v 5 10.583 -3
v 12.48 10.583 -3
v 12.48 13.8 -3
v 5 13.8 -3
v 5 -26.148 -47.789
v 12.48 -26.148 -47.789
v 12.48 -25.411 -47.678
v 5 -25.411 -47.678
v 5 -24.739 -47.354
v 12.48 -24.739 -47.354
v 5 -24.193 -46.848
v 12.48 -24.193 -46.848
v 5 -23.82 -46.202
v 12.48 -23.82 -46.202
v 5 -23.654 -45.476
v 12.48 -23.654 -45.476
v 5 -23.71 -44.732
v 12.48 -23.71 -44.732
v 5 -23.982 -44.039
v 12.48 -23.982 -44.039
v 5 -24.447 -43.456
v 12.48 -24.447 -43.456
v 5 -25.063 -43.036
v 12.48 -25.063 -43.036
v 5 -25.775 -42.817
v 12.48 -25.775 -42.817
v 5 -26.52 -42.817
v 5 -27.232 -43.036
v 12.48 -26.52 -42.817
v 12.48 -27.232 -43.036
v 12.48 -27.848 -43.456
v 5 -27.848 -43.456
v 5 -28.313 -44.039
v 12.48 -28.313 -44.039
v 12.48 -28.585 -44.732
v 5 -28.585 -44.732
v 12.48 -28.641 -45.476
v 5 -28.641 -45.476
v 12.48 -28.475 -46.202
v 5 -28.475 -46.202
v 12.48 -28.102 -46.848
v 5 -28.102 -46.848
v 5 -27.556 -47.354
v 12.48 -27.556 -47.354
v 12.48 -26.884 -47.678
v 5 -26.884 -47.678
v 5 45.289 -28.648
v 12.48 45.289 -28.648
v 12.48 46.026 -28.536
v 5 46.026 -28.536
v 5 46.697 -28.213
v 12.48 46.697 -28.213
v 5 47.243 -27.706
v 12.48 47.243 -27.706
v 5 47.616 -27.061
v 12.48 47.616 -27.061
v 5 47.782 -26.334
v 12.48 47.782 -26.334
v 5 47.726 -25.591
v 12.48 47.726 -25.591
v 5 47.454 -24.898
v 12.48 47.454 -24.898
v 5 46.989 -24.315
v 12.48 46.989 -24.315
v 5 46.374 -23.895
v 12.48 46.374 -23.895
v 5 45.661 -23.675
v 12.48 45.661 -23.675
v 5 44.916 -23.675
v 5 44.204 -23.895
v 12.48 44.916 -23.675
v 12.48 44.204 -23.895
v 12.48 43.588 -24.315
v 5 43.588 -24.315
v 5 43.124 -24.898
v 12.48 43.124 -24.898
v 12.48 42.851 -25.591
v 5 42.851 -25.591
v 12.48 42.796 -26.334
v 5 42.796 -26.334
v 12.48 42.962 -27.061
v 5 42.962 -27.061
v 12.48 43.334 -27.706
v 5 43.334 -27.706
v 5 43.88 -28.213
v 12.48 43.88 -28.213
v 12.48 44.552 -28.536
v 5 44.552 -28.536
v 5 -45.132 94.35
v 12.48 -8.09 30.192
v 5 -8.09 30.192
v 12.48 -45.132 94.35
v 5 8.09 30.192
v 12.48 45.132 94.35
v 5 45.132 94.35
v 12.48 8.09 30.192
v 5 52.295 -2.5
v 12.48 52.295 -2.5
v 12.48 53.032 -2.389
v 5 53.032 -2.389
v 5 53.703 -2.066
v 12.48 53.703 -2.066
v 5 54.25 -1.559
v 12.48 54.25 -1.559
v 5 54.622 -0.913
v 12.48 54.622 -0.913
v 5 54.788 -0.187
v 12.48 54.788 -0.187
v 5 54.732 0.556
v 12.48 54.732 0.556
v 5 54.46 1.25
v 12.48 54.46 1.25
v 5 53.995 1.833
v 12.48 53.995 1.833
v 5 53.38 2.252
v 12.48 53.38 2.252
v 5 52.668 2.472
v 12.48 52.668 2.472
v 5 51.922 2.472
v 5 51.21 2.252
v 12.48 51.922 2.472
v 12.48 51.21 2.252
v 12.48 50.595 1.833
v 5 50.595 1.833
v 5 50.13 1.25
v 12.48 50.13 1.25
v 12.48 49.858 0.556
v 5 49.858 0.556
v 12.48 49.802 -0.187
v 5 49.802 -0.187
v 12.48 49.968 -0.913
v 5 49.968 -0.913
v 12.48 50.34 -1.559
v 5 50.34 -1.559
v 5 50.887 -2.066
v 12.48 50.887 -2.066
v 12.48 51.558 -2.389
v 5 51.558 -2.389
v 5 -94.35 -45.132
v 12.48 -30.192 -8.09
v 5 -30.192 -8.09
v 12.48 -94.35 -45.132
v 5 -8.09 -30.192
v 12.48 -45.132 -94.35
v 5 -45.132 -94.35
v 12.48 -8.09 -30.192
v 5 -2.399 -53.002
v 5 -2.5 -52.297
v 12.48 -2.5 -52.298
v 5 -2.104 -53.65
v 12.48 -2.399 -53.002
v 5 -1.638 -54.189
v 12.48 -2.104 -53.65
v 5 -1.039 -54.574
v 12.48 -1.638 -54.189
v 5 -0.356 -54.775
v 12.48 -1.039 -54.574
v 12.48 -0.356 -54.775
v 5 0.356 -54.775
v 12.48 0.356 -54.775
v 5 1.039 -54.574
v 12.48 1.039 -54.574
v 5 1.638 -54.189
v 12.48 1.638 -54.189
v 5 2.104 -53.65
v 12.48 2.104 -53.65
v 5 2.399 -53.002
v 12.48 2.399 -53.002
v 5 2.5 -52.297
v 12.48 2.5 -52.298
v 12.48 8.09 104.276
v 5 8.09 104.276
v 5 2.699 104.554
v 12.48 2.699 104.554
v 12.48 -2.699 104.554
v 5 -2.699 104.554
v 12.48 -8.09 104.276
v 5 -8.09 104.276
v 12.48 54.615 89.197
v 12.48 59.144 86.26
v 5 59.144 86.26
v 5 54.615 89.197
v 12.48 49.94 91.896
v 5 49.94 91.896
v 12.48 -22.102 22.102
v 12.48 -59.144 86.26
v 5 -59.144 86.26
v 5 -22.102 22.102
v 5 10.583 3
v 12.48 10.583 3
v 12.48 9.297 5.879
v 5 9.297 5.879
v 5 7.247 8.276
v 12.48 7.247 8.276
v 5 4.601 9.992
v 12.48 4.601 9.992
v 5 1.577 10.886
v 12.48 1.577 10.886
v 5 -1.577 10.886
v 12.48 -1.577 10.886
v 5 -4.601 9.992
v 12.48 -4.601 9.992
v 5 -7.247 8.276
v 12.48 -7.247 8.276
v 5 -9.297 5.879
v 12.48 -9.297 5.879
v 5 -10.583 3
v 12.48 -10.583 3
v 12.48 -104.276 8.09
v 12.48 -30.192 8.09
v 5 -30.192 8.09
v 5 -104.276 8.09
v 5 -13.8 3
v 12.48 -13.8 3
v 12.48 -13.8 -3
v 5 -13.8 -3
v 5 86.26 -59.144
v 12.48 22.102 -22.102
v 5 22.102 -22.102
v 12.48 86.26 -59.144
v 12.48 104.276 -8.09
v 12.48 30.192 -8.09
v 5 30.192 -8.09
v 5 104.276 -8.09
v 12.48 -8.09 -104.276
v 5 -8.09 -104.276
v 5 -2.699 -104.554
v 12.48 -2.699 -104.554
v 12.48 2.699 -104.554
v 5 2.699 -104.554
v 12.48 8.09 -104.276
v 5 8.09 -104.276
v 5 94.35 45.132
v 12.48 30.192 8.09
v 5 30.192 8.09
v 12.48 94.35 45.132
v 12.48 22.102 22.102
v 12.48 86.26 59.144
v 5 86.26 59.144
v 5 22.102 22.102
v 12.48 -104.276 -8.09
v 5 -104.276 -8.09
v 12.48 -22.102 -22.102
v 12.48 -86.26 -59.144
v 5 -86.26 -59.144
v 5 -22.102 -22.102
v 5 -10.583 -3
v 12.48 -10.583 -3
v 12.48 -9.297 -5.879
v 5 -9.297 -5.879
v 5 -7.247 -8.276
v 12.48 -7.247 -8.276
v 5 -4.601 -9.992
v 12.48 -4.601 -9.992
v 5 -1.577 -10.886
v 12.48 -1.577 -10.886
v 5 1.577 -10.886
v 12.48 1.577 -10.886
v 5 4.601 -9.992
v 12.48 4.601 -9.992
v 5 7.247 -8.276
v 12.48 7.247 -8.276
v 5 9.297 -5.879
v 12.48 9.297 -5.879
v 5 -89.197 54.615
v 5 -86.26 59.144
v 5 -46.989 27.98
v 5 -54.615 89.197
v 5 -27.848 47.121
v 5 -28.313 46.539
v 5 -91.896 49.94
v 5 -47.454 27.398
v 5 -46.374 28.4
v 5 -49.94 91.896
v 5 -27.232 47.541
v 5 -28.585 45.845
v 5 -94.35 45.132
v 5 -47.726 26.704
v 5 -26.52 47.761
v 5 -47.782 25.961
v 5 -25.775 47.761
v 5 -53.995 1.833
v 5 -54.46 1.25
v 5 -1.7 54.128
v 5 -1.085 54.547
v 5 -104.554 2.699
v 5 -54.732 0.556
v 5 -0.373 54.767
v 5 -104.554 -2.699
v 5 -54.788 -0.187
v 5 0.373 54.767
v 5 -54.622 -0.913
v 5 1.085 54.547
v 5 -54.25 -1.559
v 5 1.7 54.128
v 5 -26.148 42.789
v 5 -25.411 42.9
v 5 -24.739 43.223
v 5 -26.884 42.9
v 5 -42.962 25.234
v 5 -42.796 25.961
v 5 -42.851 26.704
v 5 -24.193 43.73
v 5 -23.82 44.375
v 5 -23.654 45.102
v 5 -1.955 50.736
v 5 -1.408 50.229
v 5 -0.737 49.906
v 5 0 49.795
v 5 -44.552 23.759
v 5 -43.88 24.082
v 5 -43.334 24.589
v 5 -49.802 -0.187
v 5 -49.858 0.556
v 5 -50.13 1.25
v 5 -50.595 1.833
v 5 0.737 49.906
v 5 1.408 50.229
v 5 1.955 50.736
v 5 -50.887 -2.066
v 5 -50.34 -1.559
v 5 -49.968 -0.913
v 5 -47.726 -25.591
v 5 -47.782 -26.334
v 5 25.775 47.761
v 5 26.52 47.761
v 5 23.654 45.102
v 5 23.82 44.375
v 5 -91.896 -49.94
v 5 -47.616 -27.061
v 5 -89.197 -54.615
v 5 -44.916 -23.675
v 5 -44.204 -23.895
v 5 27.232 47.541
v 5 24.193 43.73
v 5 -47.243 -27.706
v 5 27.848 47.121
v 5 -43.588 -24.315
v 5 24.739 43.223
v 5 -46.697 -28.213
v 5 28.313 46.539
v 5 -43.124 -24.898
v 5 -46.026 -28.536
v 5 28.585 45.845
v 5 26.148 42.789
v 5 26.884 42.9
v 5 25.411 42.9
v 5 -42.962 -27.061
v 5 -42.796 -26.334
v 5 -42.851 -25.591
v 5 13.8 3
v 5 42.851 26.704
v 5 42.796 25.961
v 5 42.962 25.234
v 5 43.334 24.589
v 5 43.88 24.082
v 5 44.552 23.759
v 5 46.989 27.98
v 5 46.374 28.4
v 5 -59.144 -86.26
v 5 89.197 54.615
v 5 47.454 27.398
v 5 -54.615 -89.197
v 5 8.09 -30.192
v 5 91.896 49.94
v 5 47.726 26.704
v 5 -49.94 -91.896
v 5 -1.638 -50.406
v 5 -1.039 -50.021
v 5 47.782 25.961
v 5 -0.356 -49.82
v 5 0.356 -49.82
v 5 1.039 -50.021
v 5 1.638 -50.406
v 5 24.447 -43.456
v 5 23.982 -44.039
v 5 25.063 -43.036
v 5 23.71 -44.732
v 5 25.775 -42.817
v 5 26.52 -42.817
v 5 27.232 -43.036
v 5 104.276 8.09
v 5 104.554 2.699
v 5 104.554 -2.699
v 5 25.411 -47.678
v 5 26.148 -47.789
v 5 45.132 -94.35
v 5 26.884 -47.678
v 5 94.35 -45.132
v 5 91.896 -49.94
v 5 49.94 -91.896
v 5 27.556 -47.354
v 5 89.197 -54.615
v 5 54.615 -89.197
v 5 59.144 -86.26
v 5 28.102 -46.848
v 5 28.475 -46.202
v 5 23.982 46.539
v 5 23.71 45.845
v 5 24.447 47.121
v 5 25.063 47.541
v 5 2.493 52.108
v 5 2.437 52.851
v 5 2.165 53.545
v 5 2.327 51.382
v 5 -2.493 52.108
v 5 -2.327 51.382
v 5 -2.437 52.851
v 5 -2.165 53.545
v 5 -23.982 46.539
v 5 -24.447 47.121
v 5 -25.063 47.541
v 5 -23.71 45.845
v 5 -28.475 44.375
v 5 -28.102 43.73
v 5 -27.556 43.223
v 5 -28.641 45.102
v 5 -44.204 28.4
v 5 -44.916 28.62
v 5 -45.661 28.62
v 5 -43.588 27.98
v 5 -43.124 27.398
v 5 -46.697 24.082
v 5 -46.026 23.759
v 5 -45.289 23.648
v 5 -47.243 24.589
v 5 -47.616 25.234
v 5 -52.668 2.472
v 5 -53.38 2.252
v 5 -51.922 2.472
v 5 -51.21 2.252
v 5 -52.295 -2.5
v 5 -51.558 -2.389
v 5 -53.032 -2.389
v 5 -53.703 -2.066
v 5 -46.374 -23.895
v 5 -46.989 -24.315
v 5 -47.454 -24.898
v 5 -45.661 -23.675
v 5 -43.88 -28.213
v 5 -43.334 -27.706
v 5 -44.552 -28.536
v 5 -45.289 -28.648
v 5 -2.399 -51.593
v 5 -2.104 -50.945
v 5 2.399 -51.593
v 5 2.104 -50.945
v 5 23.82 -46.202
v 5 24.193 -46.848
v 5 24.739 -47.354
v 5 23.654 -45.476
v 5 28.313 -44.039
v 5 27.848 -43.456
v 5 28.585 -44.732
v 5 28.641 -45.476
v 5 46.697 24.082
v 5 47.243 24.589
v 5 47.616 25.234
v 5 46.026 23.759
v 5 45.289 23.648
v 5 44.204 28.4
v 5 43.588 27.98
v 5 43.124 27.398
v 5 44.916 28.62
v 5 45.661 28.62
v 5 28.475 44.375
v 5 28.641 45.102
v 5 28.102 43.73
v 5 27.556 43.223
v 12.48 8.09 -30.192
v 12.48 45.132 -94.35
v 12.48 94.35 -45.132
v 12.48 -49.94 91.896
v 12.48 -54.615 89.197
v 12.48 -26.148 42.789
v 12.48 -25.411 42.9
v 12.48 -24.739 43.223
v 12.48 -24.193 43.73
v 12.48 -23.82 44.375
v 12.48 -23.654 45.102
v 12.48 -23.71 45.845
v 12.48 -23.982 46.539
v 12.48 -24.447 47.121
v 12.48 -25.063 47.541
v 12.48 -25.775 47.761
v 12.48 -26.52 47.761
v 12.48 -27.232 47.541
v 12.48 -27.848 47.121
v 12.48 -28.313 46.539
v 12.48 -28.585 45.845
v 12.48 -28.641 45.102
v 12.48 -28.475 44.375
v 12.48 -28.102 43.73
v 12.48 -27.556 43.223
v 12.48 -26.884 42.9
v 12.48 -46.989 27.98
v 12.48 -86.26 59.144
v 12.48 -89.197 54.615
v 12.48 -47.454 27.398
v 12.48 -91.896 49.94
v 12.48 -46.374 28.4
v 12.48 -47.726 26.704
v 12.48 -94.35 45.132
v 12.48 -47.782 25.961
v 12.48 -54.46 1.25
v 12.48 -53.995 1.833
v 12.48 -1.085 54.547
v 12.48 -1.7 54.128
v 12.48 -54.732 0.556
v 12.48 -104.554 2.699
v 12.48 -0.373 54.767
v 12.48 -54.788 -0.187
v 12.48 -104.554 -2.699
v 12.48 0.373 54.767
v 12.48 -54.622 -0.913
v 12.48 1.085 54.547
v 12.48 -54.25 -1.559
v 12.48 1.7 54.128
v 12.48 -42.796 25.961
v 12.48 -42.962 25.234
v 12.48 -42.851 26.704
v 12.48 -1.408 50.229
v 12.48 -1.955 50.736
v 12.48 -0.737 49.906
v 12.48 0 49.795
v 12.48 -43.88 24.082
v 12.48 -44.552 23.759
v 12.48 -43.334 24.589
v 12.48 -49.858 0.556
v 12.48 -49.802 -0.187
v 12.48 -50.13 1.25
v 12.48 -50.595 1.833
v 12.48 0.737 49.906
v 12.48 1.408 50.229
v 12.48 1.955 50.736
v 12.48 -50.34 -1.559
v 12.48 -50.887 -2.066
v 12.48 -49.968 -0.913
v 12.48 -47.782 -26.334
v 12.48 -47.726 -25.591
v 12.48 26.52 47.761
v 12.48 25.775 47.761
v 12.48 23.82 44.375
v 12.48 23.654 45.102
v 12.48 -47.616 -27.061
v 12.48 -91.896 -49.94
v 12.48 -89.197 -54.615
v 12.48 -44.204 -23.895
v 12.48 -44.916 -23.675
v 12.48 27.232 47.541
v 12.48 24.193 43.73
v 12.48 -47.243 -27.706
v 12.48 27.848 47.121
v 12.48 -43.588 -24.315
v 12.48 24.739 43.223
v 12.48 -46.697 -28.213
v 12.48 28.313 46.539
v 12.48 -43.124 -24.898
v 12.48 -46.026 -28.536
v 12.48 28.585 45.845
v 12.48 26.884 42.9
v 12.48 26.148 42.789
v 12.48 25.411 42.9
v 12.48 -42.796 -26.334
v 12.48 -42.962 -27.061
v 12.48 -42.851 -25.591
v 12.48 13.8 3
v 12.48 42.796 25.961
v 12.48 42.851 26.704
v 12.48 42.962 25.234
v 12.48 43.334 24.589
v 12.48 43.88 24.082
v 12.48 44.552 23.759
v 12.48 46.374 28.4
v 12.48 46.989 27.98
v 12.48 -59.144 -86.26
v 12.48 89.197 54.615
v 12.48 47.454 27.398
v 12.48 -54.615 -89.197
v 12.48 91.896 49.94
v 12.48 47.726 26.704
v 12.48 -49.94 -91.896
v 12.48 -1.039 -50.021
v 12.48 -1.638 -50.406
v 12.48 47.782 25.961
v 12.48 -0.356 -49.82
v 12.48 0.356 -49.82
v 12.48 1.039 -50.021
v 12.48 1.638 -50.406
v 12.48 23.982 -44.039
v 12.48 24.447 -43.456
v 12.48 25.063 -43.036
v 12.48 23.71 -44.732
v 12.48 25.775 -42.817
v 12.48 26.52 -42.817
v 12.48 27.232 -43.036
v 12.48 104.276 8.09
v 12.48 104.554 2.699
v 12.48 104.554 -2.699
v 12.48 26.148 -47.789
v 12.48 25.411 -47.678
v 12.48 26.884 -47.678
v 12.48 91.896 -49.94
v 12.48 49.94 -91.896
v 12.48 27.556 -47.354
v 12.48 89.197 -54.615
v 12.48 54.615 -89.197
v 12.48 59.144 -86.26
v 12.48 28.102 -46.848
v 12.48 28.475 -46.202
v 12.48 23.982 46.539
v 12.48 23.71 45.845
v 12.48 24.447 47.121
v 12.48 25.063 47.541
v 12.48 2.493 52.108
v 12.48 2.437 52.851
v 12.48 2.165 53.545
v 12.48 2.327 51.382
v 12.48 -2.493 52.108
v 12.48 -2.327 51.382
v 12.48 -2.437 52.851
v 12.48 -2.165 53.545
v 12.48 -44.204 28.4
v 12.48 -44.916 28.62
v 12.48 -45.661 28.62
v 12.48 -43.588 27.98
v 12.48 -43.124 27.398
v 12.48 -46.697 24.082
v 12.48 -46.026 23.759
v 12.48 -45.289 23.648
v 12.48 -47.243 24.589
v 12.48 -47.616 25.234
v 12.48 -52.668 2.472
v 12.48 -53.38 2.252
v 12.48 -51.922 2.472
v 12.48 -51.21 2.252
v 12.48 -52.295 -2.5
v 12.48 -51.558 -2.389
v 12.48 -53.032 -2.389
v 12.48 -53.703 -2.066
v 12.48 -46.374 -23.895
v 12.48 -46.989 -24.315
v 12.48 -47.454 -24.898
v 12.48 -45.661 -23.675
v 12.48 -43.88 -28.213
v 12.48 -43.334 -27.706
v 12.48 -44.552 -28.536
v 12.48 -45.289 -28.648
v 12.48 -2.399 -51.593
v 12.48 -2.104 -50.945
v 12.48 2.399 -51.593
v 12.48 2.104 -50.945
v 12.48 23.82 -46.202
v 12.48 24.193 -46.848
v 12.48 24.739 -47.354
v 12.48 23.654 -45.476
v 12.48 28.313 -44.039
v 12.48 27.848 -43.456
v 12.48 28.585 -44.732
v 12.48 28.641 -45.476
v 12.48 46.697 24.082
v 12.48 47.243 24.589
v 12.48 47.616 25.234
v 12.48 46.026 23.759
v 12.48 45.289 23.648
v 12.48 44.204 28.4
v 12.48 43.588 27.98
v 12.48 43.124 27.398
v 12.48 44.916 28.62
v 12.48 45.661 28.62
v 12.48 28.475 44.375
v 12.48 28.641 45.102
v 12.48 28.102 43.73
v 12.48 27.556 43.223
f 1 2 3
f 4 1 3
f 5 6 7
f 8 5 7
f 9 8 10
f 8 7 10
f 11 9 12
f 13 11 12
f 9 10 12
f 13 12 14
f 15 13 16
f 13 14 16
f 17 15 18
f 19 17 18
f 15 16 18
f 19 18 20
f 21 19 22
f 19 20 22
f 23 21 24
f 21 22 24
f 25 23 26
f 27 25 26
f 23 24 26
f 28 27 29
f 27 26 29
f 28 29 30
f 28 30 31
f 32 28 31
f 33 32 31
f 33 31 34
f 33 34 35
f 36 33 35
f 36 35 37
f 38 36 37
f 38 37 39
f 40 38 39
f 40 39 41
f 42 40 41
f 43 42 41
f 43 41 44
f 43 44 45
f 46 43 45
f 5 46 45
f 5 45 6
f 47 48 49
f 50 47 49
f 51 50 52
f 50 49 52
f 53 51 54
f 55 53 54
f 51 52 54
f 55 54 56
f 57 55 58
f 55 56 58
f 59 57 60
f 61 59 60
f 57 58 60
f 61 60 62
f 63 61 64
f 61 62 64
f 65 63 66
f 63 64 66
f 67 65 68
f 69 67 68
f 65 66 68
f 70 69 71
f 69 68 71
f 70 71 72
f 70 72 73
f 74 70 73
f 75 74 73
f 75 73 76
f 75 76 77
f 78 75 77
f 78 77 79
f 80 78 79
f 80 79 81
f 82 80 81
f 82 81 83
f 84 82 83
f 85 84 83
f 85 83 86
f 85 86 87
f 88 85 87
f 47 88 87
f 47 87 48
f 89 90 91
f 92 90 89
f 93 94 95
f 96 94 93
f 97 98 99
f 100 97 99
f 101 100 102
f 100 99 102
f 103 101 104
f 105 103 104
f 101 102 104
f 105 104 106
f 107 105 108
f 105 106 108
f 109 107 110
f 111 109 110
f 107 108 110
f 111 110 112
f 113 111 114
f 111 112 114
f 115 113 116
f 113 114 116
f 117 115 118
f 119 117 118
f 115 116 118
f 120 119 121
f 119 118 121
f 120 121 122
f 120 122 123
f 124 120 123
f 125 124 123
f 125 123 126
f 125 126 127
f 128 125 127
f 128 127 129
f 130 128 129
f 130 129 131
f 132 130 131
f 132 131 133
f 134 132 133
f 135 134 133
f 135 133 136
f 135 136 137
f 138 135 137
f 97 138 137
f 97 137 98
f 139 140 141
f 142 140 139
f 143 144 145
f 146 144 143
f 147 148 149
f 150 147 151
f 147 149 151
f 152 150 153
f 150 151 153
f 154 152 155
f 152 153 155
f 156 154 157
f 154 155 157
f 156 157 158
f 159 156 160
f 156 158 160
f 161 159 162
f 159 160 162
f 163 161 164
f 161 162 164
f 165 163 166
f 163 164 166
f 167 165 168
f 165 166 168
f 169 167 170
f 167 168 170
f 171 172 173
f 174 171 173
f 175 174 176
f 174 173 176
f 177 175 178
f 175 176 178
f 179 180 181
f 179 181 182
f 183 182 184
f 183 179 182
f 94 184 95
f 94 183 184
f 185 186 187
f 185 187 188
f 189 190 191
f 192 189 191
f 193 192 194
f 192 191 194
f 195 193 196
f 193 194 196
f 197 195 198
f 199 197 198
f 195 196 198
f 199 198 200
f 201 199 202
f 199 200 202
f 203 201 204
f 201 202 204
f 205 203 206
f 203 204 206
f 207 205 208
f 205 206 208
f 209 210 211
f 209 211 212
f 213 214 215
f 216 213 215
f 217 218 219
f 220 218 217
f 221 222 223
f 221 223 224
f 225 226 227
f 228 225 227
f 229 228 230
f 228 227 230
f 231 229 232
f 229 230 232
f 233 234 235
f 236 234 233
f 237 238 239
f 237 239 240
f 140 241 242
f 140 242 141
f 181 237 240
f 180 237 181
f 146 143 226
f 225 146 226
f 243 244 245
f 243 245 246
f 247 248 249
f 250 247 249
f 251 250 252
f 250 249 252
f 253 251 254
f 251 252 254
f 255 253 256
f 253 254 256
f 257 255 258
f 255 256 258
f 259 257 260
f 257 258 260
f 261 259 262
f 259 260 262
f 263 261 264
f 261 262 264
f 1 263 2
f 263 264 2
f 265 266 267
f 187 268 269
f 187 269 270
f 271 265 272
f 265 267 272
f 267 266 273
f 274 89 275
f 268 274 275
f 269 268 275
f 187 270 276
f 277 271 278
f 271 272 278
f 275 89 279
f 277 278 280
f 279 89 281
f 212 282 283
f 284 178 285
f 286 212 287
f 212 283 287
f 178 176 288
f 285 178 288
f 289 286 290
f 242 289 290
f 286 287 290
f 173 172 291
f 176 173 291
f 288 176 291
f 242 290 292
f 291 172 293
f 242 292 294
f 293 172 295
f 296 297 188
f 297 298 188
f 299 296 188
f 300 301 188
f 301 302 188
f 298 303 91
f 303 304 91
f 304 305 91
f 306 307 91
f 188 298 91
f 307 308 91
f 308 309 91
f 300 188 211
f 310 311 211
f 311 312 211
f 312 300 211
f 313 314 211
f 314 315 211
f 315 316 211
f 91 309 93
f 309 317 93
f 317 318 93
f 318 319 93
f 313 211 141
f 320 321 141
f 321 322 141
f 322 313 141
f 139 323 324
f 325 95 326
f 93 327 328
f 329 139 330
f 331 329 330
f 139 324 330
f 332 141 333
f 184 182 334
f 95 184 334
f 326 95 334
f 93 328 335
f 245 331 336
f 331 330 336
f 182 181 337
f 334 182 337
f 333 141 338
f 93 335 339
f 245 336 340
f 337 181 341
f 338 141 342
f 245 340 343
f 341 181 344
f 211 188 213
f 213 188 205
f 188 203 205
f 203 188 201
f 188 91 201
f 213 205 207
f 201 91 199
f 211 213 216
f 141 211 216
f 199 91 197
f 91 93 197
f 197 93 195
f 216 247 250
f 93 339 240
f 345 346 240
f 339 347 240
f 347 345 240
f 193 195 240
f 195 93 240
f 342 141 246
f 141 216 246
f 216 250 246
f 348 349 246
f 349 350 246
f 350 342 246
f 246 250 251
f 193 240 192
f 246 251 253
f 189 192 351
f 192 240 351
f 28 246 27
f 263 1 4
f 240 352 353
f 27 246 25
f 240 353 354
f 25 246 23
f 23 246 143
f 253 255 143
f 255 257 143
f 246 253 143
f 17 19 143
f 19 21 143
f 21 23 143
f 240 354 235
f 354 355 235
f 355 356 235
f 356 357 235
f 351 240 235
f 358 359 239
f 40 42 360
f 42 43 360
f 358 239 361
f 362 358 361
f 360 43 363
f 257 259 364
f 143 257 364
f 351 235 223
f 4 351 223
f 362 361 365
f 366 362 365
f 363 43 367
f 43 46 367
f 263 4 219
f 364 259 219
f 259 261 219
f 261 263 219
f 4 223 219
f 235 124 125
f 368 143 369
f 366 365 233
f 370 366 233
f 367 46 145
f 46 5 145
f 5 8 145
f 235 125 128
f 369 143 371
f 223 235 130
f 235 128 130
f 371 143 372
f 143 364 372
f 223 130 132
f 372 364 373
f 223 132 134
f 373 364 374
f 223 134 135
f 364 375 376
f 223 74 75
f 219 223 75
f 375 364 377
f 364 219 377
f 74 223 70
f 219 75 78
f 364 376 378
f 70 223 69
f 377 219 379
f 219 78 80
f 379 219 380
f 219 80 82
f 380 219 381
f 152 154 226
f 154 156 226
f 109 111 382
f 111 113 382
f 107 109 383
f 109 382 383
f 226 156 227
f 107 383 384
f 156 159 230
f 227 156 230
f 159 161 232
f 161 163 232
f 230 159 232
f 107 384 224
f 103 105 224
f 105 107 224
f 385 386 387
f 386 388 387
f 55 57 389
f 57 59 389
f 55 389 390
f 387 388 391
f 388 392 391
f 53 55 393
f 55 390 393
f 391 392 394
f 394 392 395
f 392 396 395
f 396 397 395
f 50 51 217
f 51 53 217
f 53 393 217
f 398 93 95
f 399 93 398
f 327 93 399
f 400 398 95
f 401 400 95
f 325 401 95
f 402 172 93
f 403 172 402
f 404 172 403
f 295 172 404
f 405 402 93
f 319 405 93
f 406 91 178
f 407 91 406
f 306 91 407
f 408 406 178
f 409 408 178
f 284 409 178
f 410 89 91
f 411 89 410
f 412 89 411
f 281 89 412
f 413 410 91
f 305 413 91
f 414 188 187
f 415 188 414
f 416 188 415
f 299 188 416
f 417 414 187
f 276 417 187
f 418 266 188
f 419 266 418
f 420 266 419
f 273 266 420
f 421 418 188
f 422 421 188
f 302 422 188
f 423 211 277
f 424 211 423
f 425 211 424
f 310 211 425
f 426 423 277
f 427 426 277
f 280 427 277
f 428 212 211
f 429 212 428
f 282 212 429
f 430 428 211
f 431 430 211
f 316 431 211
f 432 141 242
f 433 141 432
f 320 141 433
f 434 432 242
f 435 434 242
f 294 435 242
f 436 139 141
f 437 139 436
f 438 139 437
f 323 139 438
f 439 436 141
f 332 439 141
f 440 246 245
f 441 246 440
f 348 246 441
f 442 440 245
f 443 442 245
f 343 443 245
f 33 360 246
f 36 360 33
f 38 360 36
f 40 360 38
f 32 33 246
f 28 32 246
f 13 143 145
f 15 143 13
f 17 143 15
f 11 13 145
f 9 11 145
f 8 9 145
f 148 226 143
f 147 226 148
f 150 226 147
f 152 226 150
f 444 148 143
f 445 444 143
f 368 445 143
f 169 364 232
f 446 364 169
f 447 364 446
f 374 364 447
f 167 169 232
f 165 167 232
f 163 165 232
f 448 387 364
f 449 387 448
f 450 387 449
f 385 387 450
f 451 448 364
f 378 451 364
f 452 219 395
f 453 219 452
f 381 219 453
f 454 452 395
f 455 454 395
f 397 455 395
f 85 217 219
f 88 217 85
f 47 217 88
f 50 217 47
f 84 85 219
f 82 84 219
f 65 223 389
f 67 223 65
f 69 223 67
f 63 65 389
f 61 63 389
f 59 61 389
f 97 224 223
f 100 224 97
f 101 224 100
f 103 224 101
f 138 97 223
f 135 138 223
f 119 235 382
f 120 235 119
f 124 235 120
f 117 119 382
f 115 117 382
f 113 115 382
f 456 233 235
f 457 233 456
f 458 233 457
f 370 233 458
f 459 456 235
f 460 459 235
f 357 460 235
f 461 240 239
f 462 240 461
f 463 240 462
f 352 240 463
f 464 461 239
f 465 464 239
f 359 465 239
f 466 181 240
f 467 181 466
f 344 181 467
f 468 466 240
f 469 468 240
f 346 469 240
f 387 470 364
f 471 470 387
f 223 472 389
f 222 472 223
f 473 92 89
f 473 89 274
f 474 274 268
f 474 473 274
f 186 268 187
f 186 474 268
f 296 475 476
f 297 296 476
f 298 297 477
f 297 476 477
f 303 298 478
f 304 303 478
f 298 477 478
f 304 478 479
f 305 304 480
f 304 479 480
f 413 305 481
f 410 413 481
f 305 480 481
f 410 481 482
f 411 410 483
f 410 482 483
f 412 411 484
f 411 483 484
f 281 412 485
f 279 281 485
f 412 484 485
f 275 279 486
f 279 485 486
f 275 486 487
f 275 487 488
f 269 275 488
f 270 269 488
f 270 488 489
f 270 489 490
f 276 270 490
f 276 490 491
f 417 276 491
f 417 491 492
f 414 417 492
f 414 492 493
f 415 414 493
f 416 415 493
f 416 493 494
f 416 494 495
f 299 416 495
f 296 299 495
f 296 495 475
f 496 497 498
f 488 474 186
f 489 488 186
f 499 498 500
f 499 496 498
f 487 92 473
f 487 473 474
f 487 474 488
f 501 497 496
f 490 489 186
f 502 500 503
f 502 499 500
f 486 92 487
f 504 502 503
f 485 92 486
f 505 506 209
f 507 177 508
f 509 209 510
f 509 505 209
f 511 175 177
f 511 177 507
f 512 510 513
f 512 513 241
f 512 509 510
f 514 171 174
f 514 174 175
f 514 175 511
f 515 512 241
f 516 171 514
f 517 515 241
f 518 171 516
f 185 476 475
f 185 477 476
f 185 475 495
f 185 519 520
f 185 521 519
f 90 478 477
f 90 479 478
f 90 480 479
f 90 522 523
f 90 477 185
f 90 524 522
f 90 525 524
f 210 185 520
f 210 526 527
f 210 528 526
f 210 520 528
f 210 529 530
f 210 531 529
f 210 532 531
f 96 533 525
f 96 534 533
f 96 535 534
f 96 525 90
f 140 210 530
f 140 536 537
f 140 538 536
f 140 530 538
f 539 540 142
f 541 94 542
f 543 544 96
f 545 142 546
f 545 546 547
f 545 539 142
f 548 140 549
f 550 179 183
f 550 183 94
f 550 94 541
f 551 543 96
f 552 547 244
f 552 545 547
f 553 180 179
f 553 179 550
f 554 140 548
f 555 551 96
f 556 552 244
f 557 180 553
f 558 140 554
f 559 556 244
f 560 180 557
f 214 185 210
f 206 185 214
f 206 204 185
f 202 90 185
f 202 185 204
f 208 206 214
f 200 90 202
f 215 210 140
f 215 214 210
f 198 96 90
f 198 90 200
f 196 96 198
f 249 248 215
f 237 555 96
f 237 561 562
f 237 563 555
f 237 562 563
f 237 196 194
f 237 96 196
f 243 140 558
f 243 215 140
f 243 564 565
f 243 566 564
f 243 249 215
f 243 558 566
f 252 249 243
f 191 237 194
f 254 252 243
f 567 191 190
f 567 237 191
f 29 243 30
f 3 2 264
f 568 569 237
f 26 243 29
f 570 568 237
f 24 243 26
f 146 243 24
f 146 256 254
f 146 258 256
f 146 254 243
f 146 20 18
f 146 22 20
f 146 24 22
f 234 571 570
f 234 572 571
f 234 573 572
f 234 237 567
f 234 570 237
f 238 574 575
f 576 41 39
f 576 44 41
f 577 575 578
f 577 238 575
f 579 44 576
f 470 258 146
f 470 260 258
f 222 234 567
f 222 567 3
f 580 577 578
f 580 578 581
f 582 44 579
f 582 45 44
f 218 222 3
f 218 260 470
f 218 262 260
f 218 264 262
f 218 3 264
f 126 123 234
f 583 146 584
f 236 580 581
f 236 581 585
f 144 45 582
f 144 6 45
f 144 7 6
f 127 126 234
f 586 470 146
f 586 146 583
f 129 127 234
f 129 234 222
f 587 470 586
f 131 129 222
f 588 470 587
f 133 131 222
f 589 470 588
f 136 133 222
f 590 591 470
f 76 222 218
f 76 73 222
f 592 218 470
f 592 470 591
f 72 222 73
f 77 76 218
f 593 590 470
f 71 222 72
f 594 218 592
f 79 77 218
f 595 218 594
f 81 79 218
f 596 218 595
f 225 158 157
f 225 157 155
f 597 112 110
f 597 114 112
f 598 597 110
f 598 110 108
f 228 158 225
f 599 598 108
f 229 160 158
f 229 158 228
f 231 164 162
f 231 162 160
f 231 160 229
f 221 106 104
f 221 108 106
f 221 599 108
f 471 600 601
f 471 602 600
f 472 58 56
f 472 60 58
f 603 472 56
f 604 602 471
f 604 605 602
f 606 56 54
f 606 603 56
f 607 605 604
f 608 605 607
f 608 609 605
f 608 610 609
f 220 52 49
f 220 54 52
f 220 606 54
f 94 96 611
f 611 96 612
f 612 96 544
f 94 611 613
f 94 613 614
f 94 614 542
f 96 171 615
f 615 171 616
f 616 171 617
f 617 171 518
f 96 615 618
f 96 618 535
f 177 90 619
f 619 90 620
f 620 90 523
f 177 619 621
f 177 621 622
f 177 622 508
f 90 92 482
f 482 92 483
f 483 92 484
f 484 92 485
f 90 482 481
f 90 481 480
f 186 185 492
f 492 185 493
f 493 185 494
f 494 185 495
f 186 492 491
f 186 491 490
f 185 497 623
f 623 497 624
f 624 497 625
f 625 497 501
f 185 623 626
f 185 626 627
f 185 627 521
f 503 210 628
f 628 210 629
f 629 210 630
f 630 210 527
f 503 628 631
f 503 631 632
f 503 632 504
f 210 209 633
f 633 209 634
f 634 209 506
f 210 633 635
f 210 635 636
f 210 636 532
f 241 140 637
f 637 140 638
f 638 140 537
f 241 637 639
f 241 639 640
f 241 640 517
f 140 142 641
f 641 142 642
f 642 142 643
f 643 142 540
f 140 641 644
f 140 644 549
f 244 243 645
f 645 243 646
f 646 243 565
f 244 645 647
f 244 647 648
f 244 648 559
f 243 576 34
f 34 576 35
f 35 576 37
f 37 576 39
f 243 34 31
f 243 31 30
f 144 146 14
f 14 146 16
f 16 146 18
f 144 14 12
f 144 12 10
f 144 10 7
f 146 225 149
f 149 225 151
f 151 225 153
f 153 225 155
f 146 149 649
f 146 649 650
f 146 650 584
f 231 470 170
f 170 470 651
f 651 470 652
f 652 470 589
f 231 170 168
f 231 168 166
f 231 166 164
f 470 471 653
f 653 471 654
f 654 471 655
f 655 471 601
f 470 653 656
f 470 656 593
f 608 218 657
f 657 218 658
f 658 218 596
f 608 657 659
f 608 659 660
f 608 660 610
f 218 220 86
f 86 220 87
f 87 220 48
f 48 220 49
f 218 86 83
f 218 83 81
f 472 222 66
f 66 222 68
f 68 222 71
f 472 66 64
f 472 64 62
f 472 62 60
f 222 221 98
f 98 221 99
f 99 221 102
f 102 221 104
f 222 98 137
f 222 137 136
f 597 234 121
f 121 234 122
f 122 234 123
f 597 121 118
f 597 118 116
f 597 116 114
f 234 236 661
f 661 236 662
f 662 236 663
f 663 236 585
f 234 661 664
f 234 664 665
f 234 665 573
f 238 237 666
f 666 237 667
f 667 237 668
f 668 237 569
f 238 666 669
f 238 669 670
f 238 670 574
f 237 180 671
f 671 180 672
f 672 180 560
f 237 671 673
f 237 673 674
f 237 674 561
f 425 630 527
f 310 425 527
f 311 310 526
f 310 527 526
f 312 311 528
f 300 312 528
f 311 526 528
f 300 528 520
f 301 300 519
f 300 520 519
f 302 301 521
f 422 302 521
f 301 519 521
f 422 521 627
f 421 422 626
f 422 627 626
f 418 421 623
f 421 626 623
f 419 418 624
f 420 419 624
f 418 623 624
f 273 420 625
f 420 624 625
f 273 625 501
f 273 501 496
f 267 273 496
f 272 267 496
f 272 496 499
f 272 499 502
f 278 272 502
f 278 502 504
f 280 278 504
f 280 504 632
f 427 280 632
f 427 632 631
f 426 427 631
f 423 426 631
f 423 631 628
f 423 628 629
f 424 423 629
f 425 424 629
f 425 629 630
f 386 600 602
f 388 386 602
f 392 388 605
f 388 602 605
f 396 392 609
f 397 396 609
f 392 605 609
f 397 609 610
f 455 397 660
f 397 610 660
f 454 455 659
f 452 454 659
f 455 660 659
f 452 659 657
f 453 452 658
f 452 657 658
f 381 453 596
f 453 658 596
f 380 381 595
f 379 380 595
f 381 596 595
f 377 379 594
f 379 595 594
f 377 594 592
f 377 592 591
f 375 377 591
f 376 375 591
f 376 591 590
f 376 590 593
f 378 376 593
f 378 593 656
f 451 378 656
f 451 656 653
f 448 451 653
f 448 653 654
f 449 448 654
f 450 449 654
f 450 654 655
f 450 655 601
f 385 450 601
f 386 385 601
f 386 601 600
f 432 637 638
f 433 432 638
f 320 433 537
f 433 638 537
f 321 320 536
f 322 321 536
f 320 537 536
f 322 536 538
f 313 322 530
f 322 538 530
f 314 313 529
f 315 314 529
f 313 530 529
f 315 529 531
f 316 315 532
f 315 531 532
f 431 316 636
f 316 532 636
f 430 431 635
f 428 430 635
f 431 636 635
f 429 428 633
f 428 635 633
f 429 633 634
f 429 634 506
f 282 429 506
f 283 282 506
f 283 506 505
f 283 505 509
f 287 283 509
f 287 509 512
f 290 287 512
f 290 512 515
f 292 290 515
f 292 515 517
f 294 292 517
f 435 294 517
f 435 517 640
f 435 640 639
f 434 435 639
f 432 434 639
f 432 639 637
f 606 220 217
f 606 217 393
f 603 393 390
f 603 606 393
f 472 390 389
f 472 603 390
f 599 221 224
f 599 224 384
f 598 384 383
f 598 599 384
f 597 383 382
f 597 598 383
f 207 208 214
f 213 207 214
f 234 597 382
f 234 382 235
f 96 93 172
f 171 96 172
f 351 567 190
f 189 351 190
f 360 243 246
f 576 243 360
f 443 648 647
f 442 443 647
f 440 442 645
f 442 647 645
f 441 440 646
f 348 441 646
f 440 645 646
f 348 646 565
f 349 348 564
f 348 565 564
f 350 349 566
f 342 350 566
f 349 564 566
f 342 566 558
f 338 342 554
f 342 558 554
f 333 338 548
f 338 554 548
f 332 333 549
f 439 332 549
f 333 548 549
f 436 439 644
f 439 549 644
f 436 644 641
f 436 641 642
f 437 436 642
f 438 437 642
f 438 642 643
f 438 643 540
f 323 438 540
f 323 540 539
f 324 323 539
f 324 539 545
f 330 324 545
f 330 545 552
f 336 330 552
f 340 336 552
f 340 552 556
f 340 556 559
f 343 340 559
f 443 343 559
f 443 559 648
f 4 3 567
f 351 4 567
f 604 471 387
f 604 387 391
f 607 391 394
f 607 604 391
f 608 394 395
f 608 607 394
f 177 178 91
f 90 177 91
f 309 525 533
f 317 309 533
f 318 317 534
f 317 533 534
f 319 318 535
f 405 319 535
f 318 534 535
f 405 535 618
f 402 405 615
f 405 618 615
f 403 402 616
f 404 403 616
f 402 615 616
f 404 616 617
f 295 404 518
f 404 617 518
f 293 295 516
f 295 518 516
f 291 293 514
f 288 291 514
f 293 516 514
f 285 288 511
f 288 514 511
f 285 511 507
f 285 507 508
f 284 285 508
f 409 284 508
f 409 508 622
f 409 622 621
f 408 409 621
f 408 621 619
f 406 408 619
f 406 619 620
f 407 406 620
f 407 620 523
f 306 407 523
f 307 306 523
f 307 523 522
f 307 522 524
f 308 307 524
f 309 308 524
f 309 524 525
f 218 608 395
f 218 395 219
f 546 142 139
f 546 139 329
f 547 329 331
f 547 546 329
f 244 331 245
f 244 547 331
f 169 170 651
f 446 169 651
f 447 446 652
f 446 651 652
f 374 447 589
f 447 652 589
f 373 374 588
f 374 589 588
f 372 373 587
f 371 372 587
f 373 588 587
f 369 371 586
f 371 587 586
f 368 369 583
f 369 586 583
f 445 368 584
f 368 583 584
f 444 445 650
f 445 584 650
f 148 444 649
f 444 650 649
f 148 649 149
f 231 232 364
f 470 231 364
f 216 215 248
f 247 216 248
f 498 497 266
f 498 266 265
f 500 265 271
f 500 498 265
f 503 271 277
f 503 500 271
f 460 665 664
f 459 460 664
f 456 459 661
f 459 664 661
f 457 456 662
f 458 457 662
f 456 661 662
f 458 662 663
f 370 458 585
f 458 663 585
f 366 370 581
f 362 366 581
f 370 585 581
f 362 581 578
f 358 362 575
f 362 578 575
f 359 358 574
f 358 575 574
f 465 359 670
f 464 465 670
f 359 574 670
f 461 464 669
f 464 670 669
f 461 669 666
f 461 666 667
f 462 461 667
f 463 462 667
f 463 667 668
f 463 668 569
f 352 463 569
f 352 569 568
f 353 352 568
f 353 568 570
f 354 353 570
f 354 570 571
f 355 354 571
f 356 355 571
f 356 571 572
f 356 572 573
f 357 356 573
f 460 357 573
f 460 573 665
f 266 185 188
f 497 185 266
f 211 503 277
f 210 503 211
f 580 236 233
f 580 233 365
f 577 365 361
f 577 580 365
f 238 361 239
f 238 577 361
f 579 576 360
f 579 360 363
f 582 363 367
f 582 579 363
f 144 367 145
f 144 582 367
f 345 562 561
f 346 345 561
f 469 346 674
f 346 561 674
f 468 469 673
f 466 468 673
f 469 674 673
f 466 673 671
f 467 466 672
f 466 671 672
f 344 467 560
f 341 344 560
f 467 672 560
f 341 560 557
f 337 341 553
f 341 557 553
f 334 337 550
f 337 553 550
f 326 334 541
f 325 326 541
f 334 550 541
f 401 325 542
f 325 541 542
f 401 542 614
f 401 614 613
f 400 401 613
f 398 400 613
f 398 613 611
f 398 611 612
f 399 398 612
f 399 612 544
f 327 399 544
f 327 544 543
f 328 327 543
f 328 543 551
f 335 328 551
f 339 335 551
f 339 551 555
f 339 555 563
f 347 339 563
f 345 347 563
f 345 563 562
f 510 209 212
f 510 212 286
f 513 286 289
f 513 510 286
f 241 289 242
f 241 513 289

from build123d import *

# Parameters (mm, degrees)
SKETCH1_W           = 450
SKETCH1_H           = 450
BOSS_EXTRUDE1_DEPTH = 5
BOSS_EXTRUDE2_DEPTH = 7.48
BOSS_EXTRUDE3_DEPTH = 7.48
SKETCH6_W           = 450
SKETCH6_H           = 450
CUT_EXTRUDE1_DEPTH  = 5
SKETCH7_R           = 11
SKETCH7_R_2         = 2.5
CUT_EXTRUDE2_DEPTH  = 10
SKETCH8_R           = 209.3091
SKETCH8_R_2         = 104.5891
CUT_EXTRUDE3_DEPTH  = 10
BOSS_EXTRUDE4_DEPTH = 7.48
SKETCH11_R          = 2.5
CUT_EXTRUDE5_DEPTH  = 10


# Read off the part's stored shape, not the designer's step: Boss-Extrude2
with BuildPart() as part:
    # Sketch1 → Boss-Extrude1 (new body)
    with BuildSketch(Plane(origin=(0, 0, 0), x_dir=(0, 0, -1), z_dir=(1, 0, 0))):
        Rectangle(SKETCH1_W, SKETCH1_H)
    extrude(amount=BOSS_EXTRUDE1_DEPTH)

    # Boss-Extrude2 outline → Boss-Extrude2 (add)
    with BuildSketch(Plane(origin=(5, 0, 0), x_dir=(0, 0, -1), z_dir=(1, 0, 0))):
        with BuildLine():
            Line((-164.971757583, 8.09), (-209.152698388, 8.09))
            ThreePointArc((-209.152698388, 8.09), (-209.3091, 0), (-209.152698388, -8.09))
            Line((-209.152698388, -8.09), (-164.971757583, -8.09))
            ThreePointArc((-164.971757583, -8.09), (-116.792827049, -116.792827049), (-8.09, -164.971757583))
            Line((-8.09, -164.971757583), (-8.09, -209.152698388))
            ThreePointArc((-8.09, -209.152698388), (0, -209.3091), (8.09, -209.152698388))
            Line((8.09, -209.152698388), (8.09, -164.971757583))
            ThreePointArc((8.09, -164.971757583), (116.792827049, -116.792827049), (164.971757583, -8.09))
            Line((164.971757583, -8.09), (209.152698388, -8.09))
            ThreePointArc((209.152698388, -8.09), (209.3091, 0), (209.152698388, 8.09))
            Line((209.152698388, 8.09), (164.971757583, 8.09))
            ThreePointArc((164.971757583, 8.09), (116.792827049, 116.792827049), (8.09, 164.971757583))
            Line((8.09, 164.971757583), (8.09, 209.152698388))
            ThreePointArc((8.09, 209.152698388), (0, 209.3091), (-8.09, 209.152698388))
            Line((-8.09, 209.152698388), (-8.09, 164.971757583))
            ThreePointArc((-8.09, 164.971757583), (-116.792827049, 116.792827049), (-164.971757583, 8.09))
        make_face()
        with BuildLine():
            Line((148.770198629, 8.09), (104.538333308, 8.09))
            ThreePointArc((104.538333308, 8.09), (104.8509, 0), (104.538333308, -8.09))
            Line((104.538333308, -8.09), (148.770198629, -8.09))
            ThreePointArc((148.770198629, -8.09), (105.351839329, -105.351839329), (8.09, -148.770198629))
            Line((8.09, -148.770198629), (8.09, -104.538333308))
            ThreePointArc((8.09, -104.538333308), (0, -104.8509), (-8.09, -104.538333308))
            Line((-8.09, -104.538333308), (-8.09, -148.770198629))
            ThreePointArc((-8.09, -148.770198629), (-105.351839329, -105.351839329), (-148.770198629, -8.09))
            Line((-148.770198629, -8.09), (-104.538333308, -8.09))
            ThreePointArc((-104.538333308, -8.09), (-104.8509, 0), (-104.538333308, 8.09))
            Line((-104.538333308, 8.09), (-148.770198629, 8.09))
            ThreePointArc((-148.770198629, 8.09), (-105.351839329, 105.351839329), (-8.09, 148.770198629))
            Line((-8.09, 148.770198629), (-8.09, 104.538333308))
            ThreePointArc((-8.09, 104.538333308), (0, 104.8509), (8.09, 104.538333308))
            Line((8.09, 104.538333308), (8.09, 148.770198629))
            ThreePointArc((8.09, 148.770198629), (105.351839329, 105.351839329), (148.770198629, 8.09))
        make_face(mode=Mode.SUBTRACT)
    extrude(amount=BOSS_EXTRUDE2_DEPTH)

    # Sketch5 → Boss-Extrude3 (add)
    with BuildSketch(Plane(origin=(5, 0, 0), x_dir=(0, 0, -1), z_dir=(1, 0, 0))):
        with BuildLine():
            Line((-19.319547743, 8.09), (-104.275748565, 8.09))
            ThreePointArc((-104.275748565, 8.09), (-104.5891, 0), (-104.275748565, -8.09))
            Line((-104.275748565, -8.09), (-19.319547743, -8.09))
            ThreePointArc((-19.319547743, -8.09), (0, -20.945), (19.319547743, -8.09))
            Line((19.319547743, -8.09), (104.275748565, -8.09))
            ThreePointArc((104.275748565, -8.09), (104.5891, 0), (104.275748565, 8.09))
            Line((104.275748565, 8.09), (19.319547743, 8.09))
            ThreePointArc((19.319547743, 8.09), (0, 20.945), (-19.319547743, 8.09))
        make_face()
    extrude(amount=BOSS_EXTRUDE3_DEPTH)

    # Sketch6 → Cut-Extrude1 (cut)
    with BuildSketch(Plane.ZY):
        Rectangle(SKETCH6_W, SKETCH6_H)
    extrude(amount=-CUT_EXTRUDE1_DEPTH, mode=Mode.SUBTRACT)


with BuildPart() as cut_extrude1_piece_1:
    # of the separate pieces the step leaves, piece 1, a body of its own (cut_extrude1_pieces)
    add(part.part.solids().sort_by_distance((5, 209.152698388, 8.09))[0])


with BuildPart() as cut_extrude1_piece_2:
    # of the separate pieces the step leaves, piece 2, a body of its own (cut_extrude1_pieces)
    add(part.part.solids().sort_by_distance((5, 8.09, -104.275748565))[0])


with BuildPart() as cut_extrude2_tool:
    # Sketch7 → Cut-Extrude2 (new body)
    with BuildSketch(Plane(origin=(12.48, 0, 0), x_dir=(0, 0, -1), z_dir=(1, 0, 0))):
        Circle(SKETCH7_R)
        with Locations((-183.1891, 0)):
            Circle(SKETCH7_R_2)
        with Locations((-130.9659, 0)):
            Circle(SKETCH7_R_2)
        with Locations((0, -183.1891)):
            Circle(SKETCH7_R_2)
        with Locations((0, -130.9659)):
            Circle(SKETCH7_R_2)
        with Locations((183.1891, 0)):
            Circle(SKETCH7_R_2)
        with Locations((52.3, 0)):
            Circle(SKETCH7_R_2)
        with Locations((-52.295, 0)):
            Circle(SKETCH7_R_2)
        with Locations((0, 183.1891)):
            Circle(SKETCH7_R_2)
        with Locations((0, 130.9659)):
            Circle(SKETCH7_R_2)
        with BuildLine():
            Line((-3, 13.8), (-3, 10.583005244))
            ThreePointArc((-3, 10.583005244), (0, 11), (3, 10.583005244))
            Line((3, 10.583005244), (3, 13.8))
            Line((3, 13.8), (-3, 13.8))
        make_face()
        with BuildLine():
            ThreePointArc((3, -10.583005244), (0, -11), (-3, -10.583005244))
            Line((-3, -10.583005244), (-3, -13.8))
            Line((-3, -13.8), (3, -13.8))
            Line((3, -13.8), (3, -10.583005244))
        make_face()
        with Locations((130.9659, 0)):
            Circle(SKETCH7_R_2)
    extrude(amount=-CUT_EXTRUDE2_DEPTH)


with BuildPart() as cut_extrude1_piece_1_1:
    add(cut_extrude1_piece_1.part)

    # Cut-Extrude2: cut by cut_extrude2_tool
    add(cut_extrude2_tool.part, mode=Mode.SUBTRACT)

    # Sketch8 → Cut-Extrude3 (cut)
    with BuildSketch(Plane(origin=(12.48, 0, 0), x_dir=(0, 0, -1), z_dir=(1, 0, 0))):
        Circle(SKETCH8_R)
        Circle(SKETCH8_R_2, mode=Mode.SUBTRACT)
    extrude(amount=-CUT_EXTRUDE3_DEPTH, mode=Mode.SUBTRACT)


with BuildPart() as cut_extrude1_piece_2_1:
    add(cut_extrude1_piece_2.part)

    # Cut-Extrude2: cut by cut_extrude2_tool
    add(cut_extrude2_tool.part, mode=Mode.SUBTRACT)

    # Sketch9 → Boss-Extrude4 (add)
    with BuildSketch(Plane(origin=(12.48, 0, 0), x_dir=(0, 0, -1), z_dir=(1, 0, 0))):
        with BuildLine():
            Line((-94.350447256, 45.131728766), (-30.192291033, 8.09))
            Line((-30.192291033, 8.09), (-19.319547743, 8.09))
            ThreePointArc((-19.319547743, 8.09), (0, 20.945), (19.319547743, 8.09))
            Line((19.319547743, 8.09), (30.192291033, 8.09))
            Line((30.192291033, 8.09), (94.350447256, 45.131728766))
            ThreePointArc((94.350447256, 45.131728766), (90.576817559, 52.29455), (86.260447256, 59.144019799))
            Line((86.260447256, 59.144019799), (22.102291033, 22.102291033))
            Line((22.102291033, 22.102291033), (59.144019799, 86.260447256))
            ThreePointArc((59.144019799, 86.260447256), (52.29455, 90.576817559), (45.131728766, 94.350447256))
            Line((45.131728766, 94.350447256), (8.09, 30.192291033))
            Line((8.09, 30.192291033), (8.09, 104.275748565))
            ThreePointArc((8.09, 104.275748565), (0, 104.5891), (-8.09, 104.275748565))
            Line((-8.09, 104.275748565), (-8.09, 30.192291033))
            Line((-8.09, 30.192291033), (-45.131728766, 94.350447256))
            ThreePointArc((-45.131728766, 94.350447256), (-52.29455, 90.576817559), (-59.144019799, 86.260447256))
            Line((-59.144019799, 86.260447256), (-22.102291033, 22.102291033))
            Line((-22.102291033, 22.102291033), (-86.260447256, 59.144019799))
            ThreePointArc((-86.260447256, 59.144019799), (-90.576817559, 52.29455), (-94.350447256, 45.131728766))
        make_face()
        with BuildLine():
            ThreePointArc((19.319547743, -8.09), (0, -20.945), (-19.319547743, -8.09))
            Line((-19.319547743, -8.09), (-30.192291033, -8.09))
            Line((-30.192291033, -8.09), (-94.350447256, -45.131728766))
            ThreePointArc((-94.350447256, -45.131728766), (-90.576817559, -52.29455), (-86.260447256, -59.144019799))
            Line((-86.260447256, -59.144019799), (-22.102291033, -22.102291033))
            Line((-22.102291033, -22.102291033), (-59.144019799, -86.260447256))
            ThreePointArc((-59.144019799, -86.260447256), (-52.29455, -90.576817559), (-45.131728766, -94.350447256))
            Line((-45.131728766, -94.350447256), (-8.09, -30.192291033))
            Line((-8.09, -30.192291033), (-8.09, -104.275748565))
            ThreePointArc((-8.09, -104.275748565), (0, -104.5891), (8.09, -104.275748565))
            Line((8.09, -104.275748565), (8.09, -30.192291033))
            Line((8.09, -30.192291033), (45.131728766, -94.350447256))
            ThreePointArc((45.131728766, -94.350447256), (52.29455, -90.576817559), (59.144019799, -86.260447256))
            Line((59.144019799, -86.260447256), (22.102291033, -22.102291033))
            Line((22.102291033, -22.102291033), (86.260447256, -59.144019799))
            ThreePointArc((86.260447256, -59.144019799), (90.576817559, -52.29455), (94.350447256, -45.131728766))
            Line((94.350447256, -45.131728766), (30.192291033, -8.09))
            Line((30.192291033, -8.09), (19.319547743, -8.09))
        make_face()
    extrude(amount=-BOSS_EXTRUDE4_DEPTH)

    # Sketch11 → Cut-Extrude5 (cut)
    with BuildSketch(Plane(origin=(12.48, 0, 0), x_dir=(0, 0, -1), z_dir=(1, 0, 0))):
        with Locations((-52.295, 0)):
            Circle(SKETCH11_R)
        with Locations((-45.288798491, 26.1475)):
            Circle(SKETCH11_R)
        with Locations((-26.1475, 45.288798491)):
            Circle(SKETCH11_R)
        with Locations((0, 52.295)):
            Circle(SKETCH11_R)
        with Locations((26.1475, 45.288798491)):
            Circle(SKETCH11_R)
        with Locations((45.288798491, 26.1475)):
            Circle(SKETCH11_R)
        with Locations((52.295, 0)):
            Circle(SKETCH11_R)
        with Locations((45.288798491, -26.1475)):
            Circle(SKETCH11_R)
        with Locations((26.1475, -45.288798491)):
            Circle(SKETCH11_R)
        with Locations((0, -52.295)):
            Circle(SKETCH11_R)
        with Locations((-26.1475, -45.288798491)):
            Circle(SKETCH11_R)
        with Locations((-45.288798491, -26.1475)):
            Circle(SKETCH11_R)
    extrude(amount=-CUT_EXTRUDE5_DEPTH, mode=Mode.SUBTRACT)


solid = cut_extrude1_piece_2_1.part
